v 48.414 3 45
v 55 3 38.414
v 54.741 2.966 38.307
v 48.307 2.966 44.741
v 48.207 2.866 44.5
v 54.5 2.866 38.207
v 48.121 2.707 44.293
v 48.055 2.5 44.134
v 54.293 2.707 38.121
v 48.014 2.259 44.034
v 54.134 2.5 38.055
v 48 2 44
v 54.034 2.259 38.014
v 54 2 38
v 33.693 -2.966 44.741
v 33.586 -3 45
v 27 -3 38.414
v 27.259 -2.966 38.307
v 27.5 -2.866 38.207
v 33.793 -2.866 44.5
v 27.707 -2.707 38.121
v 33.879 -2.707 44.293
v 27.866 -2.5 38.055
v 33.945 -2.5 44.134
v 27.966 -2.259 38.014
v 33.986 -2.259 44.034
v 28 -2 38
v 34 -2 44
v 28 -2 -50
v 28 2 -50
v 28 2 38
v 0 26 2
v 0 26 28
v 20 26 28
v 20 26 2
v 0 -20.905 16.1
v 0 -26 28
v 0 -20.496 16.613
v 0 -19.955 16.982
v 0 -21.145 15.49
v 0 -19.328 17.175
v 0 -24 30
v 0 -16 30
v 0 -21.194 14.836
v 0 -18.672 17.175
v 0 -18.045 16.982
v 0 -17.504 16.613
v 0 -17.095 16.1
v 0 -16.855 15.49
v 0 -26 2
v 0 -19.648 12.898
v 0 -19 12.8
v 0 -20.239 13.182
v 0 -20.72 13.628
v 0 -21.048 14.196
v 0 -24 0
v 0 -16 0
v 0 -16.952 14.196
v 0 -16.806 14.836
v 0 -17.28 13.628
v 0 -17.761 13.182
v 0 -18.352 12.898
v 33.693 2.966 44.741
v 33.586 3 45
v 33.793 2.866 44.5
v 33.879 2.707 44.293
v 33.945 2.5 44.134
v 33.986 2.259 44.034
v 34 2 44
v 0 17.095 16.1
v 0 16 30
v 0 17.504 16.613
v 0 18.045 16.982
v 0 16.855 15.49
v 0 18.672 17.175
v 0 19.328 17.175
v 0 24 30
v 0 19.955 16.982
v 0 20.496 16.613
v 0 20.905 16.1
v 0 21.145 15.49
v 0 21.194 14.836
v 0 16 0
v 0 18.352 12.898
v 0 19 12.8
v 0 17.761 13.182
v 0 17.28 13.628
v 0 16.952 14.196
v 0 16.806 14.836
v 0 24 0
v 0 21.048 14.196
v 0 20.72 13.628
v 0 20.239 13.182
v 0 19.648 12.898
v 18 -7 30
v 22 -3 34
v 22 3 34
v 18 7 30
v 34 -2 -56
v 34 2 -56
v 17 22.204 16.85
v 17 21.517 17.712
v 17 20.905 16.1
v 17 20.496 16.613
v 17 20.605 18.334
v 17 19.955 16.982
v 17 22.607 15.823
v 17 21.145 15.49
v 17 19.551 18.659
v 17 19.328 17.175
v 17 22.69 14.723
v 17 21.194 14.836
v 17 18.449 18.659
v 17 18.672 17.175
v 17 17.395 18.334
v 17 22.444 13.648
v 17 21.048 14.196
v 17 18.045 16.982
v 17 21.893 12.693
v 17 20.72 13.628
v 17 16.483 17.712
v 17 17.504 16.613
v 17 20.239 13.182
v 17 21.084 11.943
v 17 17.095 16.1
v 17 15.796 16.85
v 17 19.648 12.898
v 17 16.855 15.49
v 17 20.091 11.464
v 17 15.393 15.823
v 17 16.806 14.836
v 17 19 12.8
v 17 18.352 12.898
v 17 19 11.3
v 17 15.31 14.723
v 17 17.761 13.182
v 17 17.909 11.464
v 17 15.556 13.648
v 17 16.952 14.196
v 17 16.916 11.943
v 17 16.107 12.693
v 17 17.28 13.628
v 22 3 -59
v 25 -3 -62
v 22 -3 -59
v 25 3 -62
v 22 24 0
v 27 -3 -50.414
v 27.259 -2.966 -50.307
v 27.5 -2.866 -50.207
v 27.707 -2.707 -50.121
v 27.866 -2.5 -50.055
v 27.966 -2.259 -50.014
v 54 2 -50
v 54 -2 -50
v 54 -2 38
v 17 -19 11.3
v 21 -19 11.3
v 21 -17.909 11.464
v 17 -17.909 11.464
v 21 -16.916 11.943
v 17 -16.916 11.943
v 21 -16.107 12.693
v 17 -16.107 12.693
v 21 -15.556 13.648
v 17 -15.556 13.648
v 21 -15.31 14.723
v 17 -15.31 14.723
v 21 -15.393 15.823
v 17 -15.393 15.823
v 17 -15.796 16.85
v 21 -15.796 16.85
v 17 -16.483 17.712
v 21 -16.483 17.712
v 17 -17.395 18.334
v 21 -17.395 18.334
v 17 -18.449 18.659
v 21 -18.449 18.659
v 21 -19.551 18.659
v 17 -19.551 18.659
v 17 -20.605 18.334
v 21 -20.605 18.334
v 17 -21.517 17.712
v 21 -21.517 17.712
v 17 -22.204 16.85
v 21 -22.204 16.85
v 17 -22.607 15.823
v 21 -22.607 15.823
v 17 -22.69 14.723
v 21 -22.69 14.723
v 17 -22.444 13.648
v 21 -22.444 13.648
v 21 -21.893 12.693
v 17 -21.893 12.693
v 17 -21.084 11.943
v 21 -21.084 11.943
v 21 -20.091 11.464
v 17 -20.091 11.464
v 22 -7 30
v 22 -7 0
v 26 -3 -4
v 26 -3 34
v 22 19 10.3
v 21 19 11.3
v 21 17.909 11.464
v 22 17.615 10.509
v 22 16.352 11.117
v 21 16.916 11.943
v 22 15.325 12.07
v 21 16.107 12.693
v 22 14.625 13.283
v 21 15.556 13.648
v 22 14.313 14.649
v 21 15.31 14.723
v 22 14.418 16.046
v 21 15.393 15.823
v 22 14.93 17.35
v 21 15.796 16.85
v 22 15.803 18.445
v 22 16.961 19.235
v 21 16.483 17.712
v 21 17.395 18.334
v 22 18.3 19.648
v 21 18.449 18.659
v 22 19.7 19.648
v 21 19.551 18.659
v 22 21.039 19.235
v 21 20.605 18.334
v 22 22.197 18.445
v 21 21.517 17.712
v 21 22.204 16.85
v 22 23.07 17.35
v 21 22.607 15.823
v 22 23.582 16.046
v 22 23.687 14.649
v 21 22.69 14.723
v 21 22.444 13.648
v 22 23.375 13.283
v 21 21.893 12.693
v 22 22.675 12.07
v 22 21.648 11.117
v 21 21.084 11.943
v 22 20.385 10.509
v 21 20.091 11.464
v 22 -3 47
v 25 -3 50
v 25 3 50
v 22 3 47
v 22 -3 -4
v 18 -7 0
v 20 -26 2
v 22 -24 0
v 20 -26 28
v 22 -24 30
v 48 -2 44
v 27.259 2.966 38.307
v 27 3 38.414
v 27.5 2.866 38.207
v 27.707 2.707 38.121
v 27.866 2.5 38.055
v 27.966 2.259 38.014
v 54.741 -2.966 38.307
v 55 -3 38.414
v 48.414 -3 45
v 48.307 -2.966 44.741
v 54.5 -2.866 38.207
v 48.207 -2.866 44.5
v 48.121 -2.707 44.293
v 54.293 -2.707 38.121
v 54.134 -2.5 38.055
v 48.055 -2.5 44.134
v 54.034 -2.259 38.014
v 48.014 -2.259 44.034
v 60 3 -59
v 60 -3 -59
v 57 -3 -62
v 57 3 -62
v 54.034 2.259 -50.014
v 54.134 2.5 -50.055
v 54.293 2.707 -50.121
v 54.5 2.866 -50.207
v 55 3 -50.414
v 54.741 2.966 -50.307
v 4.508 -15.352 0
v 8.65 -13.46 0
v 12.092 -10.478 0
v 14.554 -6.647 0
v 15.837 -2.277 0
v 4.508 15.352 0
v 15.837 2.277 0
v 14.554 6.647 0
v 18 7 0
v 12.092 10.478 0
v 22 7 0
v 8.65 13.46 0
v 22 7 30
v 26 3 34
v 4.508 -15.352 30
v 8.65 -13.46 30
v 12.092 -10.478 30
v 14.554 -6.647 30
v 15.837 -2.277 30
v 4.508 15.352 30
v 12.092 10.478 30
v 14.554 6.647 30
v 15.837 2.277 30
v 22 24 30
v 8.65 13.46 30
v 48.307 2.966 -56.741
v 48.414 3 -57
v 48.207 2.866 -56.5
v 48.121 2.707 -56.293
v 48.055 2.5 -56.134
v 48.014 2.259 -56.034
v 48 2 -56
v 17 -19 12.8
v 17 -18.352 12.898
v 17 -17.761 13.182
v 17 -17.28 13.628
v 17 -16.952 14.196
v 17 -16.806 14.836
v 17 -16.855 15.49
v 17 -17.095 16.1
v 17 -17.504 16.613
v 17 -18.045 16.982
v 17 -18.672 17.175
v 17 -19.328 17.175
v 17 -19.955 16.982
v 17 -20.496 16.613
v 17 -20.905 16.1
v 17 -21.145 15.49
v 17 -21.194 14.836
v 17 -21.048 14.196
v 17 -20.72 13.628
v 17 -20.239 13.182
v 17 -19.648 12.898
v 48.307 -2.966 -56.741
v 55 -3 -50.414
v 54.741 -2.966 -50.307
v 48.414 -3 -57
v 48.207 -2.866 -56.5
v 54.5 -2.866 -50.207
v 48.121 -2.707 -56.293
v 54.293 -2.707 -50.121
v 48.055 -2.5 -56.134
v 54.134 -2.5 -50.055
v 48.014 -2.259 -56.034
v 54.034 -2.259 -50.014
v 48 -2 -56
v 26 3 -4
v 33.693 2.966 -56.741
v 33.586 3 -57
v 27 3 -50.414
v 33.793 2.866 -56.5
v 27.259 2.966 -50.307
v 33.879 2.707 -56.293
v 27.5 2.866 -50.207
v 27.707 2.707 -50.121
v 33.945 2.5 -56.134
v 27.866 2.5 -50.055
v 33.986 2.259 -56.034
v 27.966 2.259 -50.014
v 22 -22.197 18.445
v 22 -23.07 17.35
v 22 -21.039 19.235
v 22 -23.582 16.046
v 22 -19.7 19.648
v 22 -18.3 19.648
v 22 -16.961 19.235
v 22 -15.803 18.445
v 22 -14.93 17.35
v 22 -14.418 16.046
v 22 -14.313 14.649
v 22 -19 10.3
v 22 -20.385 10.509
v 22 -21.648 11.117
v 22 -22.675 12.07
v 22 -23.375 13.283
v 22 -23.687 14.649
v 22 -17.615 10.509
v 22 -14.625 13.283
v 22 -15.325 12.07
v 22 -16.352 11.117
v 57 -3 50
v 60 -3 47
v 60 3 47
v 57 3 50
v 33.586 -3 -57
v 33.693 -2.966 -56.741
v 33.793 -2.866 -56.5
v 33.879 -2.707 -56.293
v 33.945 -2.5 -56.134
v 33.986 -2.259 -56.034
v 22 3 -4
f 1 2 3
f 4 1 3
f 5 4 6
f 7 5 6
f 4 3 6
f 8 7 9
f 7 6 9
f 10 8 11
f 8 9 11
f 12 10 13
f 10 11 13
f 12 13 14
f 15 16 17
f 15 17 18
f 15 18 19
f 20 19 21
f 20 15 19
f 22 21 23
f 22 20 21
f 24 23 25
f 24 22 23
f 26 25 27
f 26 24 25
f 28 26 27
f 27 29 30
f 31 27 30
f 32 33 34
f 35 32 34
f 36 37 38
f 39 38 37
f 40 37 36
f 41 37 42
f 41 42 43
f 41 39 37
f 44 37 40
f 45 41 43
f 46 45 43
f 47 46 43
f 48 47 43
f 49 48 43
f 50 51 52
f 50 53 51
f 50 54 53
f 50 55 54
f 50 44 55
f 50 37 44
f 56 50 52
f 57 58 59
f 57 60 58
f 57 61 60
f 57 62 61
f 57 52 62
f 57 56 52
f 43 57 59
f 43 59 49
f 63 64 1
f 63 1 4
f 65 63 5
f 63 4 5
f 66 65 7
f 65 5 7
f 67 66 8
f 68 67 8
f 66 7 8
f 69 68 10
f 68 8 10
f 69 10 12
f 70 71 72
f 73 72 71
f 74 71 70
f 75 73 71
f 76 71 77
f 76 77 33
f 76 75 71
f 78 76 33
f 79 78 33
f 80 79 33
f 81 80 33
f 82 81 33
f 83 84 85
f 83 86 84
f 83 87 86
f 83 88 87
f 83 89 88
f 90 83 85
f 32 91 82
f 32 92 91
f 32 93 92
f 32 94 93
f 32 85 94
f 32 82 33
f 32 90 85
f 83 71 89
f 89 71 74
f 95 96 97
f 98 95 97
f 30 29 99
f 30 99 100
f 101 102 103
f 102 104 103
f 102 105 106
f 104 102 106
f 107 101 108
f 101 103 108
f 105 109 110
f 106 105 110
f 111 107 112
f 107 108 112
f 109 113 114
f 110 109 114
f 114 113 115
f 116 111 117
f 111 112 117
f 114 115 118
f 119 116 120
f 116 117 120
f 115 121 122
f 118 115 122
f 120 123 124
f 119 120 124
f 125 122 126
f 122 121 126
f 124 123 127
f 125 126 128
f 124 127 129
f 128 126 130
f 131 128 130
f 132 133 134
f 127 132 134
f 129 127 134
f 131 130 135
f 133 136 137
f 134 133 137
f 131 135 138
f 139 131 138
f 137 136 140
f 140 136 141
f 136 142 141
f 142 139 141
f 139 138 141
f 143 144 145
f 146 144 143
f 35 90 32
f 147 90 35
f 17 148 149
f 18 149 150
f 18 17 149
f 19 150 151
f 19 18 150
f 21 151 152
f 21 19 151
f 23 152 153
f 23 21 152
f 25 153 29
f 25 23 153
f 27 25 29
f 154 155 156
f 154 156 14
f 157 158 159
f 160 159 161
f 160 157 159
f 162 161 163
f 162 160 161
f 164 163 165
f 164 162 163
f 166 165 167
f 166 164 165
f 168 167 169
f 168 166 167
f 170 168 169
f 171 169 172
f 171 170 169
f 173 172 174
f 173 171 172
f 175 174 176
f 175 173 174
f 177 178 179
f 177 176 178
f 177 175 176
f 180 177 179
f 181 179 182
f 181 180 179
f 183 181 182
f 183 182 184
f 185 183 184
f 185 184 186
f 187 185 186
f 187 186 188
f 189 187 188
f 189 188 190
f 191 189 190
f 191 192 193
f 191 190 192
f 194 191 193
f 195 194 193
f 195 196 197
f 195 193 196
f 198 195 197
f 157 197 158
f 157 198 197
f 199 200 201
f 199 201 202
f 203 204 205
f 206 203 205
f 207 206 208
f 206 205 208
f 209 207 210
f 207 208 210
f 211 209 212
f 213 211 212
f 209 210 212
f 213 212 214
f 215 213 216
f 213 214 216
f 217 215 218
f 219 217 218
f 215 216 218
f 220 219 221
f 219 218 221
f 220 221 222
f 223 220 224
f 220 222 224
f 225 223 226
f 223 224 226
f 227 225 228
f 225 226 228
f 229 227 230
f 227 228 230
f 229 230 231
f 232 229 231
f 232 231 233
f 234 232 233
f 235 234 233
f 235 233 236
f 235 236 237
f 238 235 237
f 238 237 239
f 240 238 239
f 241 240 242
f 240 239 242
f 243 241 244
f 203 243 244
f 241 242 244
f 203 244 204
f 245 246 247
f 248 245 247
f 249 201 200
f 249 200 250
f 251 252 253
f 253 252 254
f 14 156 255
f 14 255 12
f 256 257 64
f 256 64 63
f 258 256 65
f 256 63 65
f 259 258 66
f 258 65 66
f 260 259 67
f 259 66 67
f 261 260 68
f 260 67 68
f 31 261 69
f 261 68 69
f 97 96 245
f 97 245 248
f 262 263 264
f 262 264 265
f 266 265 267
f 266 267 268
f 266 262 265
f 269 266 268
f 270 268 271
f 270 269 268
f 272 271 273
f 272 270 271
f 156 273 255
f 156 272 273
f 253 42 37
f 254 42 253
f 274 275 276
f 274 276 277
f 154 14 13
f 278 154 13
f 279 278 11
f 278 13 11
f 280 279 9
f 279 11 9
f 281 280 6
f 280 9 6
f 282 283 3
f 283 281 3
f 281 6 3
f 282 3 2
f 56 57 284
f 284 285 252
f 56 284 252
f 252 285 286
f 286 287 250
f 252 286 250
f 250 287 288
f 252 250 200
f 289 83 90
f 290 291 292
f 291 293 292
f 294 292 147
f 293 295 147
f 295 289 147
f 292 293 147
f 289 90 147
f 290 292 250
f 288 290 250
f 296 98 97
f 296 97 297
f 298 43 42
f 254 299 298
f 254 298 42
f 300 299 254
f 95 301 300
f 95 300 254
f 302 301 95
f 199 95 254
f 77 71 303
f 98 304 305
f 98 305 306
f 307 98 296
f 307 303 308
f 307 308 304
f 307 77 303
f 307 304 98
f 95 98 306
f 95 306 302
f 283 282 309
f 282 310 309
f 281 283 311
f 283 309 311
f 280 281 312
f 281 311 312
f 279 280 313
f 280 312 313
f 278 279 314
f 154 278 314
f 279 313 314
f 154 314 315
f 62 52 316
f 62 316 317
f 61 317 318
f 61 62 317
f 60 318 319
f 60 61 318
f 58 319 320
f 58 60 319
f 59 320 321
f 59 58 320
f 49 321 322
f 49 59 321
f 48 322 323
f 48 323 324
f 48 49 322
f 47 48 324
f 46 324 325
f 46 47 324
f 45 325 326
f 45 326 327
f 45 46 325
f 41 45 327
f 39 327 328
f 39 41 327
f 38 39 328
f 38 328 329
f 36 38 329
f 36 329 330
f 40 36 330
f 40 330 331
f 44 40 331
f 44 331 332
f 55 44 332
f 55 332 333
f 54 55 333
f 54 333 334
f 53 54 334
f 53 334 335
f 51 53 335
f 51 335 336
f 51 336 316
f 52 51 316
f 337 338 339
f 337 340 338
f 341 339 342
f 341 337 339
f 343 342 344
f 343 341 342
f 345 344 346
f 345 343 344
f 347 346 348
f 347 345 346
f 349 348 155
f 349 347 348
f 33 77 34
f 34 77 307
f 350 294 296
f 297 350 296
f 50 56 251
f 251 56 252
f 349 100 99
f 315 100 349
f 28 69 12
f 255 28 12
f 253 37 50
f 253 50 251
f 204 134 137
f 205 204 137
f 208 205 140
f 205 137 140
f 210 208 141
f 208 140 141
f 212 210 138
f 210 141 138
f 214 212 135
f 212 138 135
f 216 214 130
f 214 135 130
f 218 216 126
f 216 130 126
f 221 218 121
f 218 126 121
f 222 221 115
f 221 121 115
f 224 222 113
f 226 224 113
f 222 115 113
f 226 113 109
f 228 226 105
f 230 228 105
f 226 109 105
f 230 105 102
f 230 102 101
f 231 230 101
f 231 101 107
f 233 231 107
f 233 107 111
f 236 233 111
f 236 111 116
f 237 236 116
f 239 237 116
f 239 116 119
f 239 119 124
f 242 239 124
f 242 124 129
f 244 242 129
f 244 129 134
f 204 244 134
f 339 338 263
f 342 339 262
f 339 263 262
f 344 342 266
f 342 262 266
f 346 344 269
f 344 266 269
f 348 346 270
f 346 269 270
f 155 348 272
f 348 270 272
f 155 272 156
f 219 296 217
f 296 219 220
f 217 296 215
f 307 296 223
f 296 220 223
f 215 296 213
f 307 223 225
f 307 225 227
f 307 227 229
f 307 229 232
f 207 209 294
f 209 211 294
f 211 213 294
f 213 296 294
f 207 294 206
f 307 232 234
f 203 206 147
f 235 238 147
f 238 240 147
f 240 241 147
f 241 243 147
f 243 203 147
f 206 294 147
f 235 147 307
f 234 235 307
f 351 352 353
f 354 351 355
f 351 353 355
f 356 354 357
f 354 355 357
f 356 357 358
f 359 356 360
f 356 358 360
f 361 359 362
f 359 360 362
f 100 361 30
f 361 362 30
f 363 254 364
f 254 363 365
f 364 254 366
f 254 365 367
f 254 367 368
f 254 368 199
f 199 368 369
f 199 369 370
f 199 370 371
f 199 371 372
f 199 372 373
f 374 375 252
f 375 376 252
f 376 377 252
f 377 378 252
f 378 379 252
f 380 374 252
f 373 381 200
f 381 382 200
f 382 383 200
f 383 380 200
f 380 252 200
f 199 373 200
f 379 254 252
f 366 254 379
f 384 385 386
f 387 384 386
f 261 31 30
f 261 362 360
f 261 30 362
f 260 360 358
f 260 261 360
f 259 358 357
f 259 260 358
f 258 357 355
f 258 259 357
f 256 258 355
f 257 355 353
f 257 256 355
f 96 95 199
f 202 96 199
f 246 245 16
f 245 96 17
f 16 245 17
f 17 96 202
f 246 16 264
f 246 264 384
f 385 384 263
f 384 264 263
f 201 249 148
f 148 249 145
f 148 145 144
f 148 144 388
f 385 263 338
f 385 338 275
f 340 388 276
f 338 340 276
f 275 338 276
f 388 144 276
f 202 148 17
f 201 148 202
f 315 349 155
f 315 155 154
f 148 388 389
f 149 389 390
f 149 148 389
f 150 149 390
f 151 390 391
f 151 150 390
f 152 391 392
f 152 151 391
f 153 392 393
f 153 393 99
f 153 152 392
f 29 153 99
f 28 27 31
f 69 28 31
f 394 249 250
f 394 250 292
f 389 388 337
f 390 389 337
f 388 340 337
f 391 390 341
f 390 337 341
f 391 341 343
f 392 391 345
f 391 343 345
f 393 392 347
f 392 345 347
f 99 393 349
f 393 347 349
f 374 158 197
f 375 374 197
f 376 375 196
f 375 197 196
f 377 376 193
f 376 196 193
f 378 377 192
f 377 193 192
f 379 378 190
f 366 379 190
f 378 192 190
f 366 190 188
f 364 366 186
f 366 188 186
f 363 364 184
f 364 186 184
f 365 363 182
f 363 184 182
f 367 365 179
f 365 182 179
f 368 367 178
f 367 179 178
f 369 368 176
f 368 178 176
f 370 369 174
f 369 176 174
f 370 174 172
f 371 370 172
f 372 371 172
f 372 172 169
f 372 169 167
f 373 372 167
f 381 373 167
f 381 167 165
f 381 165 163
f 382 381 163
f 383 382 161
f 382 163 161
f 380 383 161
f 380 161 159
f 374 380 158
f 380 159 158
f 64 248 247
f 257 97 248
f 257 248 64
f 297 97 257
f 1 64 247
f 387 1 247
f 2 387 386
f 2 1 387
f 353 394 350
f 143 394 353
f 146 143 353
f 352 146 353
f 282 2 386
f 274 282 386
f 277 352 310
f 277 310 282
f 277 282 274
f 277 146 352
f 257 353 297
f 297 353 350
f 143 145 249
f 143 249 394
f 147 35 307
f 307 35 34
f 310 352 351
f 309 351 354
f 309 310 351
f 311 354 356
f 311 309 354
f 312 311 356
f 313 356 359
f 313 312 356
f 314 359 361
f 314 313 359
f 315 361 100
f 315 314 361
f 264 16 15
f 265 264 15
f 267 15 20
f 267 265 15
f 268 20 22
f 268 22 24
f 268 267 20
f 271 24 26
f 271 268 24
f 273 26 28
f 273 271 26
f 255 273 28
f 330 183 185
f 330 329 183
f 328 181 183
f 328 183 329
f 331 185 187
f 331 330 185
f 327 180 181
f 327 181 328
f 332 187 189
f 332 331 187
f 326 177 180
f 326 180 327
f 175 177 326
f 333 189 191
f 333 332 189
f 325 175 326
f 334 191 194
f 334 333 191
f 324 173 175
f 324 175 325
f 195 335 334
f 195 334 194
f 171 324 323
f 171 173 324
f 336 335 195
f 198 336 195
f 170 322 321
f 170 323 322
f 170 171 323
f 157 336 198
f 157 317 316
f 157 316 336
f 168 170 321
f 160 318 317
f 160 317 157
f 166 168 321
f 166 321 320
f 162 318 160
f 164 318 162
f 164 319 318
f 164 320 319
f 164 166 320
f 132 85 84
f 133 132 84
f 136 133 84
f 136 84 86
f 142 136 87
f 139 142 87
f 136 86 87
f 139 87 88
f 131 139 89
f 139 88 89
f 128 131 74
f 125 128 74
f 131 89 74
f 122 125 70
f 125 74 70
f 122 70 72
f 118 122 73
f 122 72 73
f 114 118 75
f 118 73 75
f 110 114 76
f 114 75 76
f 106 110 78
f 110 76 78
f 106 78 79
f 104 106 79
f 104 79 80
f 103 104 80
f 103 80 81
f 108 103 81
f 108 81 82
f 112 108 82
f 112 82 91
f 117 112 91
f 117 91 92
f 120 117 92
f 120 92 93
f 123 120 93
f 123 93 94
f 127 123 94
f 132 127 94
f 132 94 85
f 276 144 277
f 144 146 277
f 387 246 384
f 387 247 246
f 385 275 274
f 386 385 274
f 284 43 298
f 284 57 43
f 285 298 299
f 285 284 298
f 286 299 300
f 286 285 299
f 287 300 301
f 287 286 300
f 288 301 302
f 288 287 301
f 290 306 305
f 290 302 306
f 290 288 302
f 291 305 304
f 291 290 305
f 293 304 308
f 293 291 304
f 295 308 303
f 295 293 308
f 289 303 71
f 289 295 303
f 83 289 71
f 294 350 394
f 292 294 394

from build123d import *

# Parameters (mm, degrees)
CYLINDER003_R     = 3.7
CYLINDER003_DEPTH = 6
CYLINDER002_R     = 2.2
CYLINDER002_DEPTH = 70
CYLINDER_R        = 16
CYLINDER_DEPTH    = 100
BOX002_W          = 26
BOX002_H          = 6
BOX002_DEPTH      = 100
BOX001_W          = 38
BOX001_H          = 6
BOX001_DEPTH      = 112
CHAMFER_SIZE      = 3
CHAMFER001_SIZE   = 6
FILLET_R          = 1
FILLET001_R       = 1
FILLET002_R       = 1
BOX_W             = 22
BOX_H             = 52
BOX_DEPTH         = 30
CHAMFER002_SIZE   = 2
CHAMFER003_SIZE   = 4
CHAMFER004_SIZE   = 4
CHAMFER005_SIZE   = 4
CHAMFER006_SIZE   = 1


with BuildPart() as cylinder002:
    # Cylinder003 → Cylinder003 (new body)
    with BuildSketch(Plane(origin=(70, 0, 0), x_dir=(0, 0, -1), z_dir=(1, 0, 0))):
        Circle(CYLINDER003_R)
    extrude(amount=CYLINDER003_DEPTH)


with BuildPart() as tornillom4:
    # Cylinder002 → Cylinder002 (new body)
    with BuildSketch(Plane(origin=(0, 0, 0), x_dir=(0, 0, -1), z_dir=(1, 0, 0))):
        Circle(CYLINDER002_R)
    extrude(amount=CYLINDER002_DEPTH)

    # Fusion004: union Cylinder002
    add(cylinder002.part)


with BuildPart() as tornillom4_1:
    # Fusion004 placement: moved
    add(tornillom4.part.moved(Location((-53, -19, 15))))


with BuildPart() as tornillos:
    # Part__Mirroring: instance of tornilloM4
    add(tornillom4_1.part.mirror(Plane(origin=(0, 0, 0), x_dir=(1, 0, 0), z_dir=(0, 1, 0))))

    # Fusion007: union tornilloM4
    add(tornillom4_1.part)


with BuildPart() as barra:
    # Cylinder → Cylinder (new body)
    with BuildSketch(Plane.XY):
        Circle(CYLINDER_R)
    extrude(amount=CYLINDER_DEPTH)


with BuildPart() as cube002:
    # Box002 → Box002 (new body)
    with BuildSketch(Plane(origin=(28, -3, -56), x_dir=(1, 0, 0), z_dir=(0, 0, 1))):
        with Locations((13, 3)):
            Rectangle(BOX002_W, BOX002_H)
    extrude(amount=BOX002_DEPTH)


with BuildPart() as fillet002:
    # Box001 → Box001 (new body)
    with BuildSketch(Plane(origin=(22, -3, -62), x_dir=(1, 0, 0), z_dir=(0, 0, 1))):
        with Locations((19, 3)):
            Rectangle(BOX001_W, BOX001_H)
    extrude(amount=BOX001_DEPTH)

    # Cut: cut Cube002
    add(cube002.part, mode=Mode.SUBTRACT)

    # Chamfer
    chamfer_edges = [fillet002.edges().sort_by_distance(p)[0] for p in [
        (22, 0, 50),
        (22, 0, -62),
        (60, 0, 50),
        (60, 0, -62),
    ]]
    chamfer(chamfer_edges, length=CHAMFER_SIZE)

    # Chamfer001
    chamfer001_edges = [fillet002.edges().sort_by_distance(p)[0] for p in [
        (54, 0, 44),
        (54, 0, -56),
        (28, 0, -56),
        (28, 0, 44),
    ]]
    chamfer(chamfer001_edges, length=CHAMFER001_SIZE)

    # Fillet
    fillet_edges = [fillet002.edges().sort_by_distance(p)[0] for p in [
        (54, -3, -6),
        (28, -3, -6),
        (54, 3, -6),
        (28, 3, -6),
    ]]
    fillet(fillet_edges, radius=FILLET_R)

    # Fillet001
    fillet001_edges = [fillet002.edges().sort_by_distance(p)[0] for p in [
        (41, -3, -56),
        (41, -3, 44),
        (41, 3, -56),
        (41, 3, 44),
    ]]
    fillet(fillet001_edges, radius=FILLET001_R)

    # Fillet002
    fillet002_edges = [fillet002.edges().sort_by_distance(p)[0] for p in [
        (31, -3, -53),
        (51, -3, -53),
        (31, -3, 41),
        (51, -3, 41),
        (31, 3, -53),
        (51, 3, -53),
        (31, 3, 41),
        (51, 3, 41),
    ]]
    fillet(fillet002_edges, radius=FILLET002_R)


with BuildPart() as guia_final:
    # Box → Box (new body)
    with BuildSketch(Plane(origin=(0, -26, 0), x_dir=(1, 0, 0), z_dir=(0, 0, 1))):
        with Locations((11, 26)):
            Rectangle(BOX_W, BOX_H)
    extrude(amount=BOX_DEPTH)

    # Chamfer002
    chamfer002_edges = [guia_final.edges().sort_by_distance(p)[0] for p in [
        (22, -26, 15),
        (22, 26, 15),
        (11, -26, 0),
        (11, -26, 30),
        (11, 26, 0),
        (11, 26, 30),
    ]]
    chamfer(chamfer002_edges, length=CHAMFER002_SIZE)

    # Fusion: union Fillet002
    add(fillet002.part)

    # Chamfer003
    chamfer003_edges = [guia_final.edges().sort_by_distance(p)[0] for p in [
        (22, -3, 15),
        (22, 3, 15),
    ]]
    chamfer(chamfer003_edges, length=CHAMFER003_SIZE)

    # Chamfer004
    chamfer004_edges = [guia_final.edges().sort_by_distance(p)[0] for p in [
        (22, 0, 0),
        (22, 0, 30),
    ]]
    chamfer(chamfer004_edges, length=CHAMFER004_SIZE)

    # Chamfer005
    chamfer005_edges = [guia_final.edges().sort_by_distance(p)[0] for p in [
        (20, -3, 0),
        (24, -3, 0),
        (20, 3, 0),
        (24, 3, 0),
        (24, -3, 30),
        (20, -3, 30),
        (24, 3, 30),
        (20, 3, 30),
    ]]
    chamfer(chamfer005_edges, length=CHAMFER005_SIZE)

    # Cut001: cut barra
    add(barra.part, mode=Mode.SUBTRACT)

    # Cut002: cut tornillos
    add(tornillos.part, mode=Mode.SUBTRACT)

    # Chamfer006
    chamfer006_edges = [guia_final.edges().sort_by_distance(p)[0] for p in [
        (22, -19, 18.7),
        (22, 19, 18.7),
    ]]
    chamfer(chamfer006_edges, length=CHAMFER006_SIZE)


solid = guia_final.part
